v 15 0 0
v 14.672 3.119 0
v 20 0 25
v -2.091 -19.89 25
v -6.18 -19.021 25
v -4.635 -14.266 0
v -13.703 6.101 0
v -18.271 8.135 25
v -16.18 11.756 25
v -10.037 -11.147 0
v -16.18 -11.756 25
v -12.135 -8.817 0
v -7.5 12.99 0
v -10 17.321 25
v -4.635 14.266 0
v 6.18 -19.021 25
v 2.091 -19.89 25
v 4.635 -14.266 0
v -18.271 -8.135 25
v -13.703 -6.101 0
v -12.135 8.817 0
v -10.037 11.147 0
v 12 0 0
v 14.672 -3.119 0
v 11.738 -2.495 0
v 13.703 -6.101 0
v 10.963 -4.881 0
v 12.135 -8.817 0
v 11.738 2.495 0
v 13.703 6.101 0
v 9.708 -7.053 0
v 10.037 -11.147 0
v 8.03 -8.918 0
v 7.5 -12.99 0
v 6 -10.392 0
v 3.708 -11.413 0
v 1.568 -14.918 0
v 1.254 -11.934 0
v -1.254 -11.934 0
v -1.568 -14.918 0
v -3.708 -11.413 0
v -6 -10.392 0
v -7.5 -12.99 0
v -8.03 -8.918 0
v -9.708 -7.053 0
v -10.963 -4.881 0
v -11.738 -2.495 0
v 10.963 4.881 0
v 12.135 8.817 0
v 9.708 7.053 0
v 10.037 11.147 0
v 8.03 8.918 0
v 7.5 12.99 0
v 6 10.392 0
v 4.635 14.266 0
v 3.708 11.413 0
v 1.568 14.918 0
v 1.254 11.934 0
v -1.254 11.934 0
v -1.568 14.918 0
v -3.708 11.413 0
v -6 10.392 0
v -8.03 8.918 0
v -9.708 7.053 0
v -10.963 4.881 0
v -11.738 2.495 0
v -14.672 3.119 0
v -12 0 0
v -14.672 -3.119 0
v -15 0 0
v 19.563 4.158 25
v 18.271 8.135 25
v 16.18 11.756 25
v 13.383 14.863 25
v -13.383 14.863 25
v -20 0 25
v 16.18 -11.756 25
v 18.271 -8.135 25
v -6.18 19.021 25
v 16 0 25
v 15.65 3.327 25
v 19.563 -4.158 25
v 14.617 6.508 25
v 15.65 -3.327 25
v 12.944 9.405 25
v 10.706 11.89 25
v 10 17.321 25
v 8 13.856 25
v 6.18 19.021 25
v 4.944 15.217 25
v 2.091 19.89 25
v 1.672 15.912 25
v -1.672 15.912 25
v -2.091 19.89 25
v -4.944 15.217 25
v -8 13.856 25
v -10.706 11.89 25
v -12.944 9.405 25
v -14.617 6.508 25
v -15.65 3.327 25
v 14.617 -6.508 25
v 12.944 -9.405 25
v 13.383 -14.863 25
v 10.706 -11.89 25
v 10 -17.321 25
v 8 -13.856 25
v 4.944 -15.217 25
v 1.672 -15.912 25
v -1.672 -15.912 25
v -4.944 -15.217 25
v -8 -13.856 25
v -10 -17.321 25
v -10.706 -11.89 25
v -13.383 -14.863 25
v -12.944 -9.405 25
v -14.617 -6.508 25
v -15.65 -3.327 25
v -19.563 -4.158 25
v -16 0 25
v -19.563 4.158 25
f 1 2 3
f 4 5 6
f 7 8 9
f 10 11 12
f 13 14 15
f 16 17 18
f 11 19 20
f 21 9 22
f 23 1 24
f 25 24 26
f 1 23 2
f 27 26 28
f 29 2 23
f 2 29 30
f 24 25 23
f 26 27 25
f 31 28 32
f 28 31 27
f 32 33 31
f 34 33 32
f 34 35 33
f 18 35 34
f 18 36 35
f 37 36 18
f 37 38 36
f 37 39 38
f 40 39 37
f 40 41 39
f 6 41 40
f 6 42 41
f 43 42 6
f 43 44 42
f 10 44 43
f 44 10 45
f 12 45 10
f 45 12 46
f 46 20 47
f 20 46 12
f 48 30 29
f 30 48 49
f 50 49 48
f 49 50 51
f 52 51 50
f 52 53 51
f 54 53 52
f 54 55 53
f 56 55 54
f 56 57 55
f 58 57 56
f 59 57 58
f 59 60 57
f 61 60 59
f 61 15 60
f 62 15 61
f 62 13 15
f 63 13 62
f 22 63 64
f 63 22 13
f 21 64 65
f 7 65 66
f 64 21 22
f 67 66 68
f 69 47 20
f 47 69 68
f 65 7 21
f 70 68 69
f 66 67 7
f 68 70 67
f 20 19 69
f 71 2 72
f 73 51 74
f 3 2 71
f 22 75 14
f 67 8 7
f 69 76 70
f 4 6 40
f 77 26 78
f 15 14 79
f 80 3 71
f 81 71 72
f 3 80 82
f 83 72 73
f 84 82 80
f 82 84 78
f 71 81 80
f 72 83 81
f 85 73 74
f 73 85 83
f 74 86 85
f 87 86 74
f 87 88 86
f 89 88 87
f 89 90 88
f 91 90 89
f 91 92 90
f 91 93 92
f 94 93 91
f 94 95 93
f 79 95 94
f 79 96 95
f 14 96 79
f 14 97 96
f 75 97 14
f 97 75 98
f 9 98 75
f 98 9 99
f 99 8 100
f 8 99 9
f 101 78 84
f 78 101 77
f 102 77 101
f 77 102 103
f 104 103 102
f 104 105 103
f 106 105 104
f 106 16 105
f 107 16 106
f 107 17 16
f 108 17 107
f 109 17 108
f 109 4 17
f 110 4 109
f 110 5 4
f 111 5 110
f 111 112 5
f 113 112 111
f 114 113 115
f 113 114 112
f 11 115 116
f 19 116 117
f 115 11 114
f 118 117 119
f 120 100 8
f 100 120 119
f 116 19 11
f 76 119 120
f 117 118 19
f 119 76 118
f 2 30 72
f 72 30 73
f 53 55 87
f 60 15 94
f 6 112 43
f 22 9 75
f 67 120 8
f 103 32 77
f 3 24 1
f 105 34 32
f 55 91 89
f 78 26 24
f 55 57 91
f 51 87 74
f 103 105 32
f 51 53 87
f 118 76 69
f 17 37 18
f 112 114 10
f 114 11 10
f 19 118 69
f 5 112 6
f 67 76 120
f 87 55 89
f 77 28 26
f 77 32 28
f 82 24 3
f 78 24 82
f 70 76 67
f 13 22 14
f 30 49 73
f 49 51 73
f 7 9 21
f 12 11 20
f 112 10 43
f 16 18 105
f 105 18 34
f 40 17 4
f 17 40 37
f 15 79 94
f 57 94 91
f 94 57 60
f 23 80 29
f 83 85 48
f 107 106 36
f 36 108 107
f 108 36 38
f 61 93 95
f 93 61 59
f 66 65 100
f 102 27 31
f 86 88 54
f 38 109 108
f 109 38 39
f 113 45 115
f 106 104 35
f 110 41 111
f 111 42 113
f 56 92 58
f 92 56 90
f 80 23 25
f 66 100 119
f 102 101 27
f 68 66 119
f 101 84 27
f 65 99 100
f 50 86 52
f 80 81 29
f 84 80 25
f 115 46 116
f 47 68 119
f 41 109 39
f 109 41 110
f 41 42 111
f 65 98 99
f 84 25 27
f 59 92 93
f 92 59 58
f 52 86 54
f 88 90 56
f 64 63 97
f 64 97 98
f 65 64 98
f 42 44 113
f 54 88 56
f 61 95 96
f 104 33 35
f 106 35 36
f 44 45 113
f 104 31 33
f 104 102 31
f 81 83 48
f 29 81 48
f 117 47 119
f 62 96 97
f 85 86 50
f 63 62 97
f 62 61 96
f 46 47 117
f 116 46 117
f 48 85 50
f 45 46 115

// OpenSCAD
out_top = 20;
out_bot = 15;
in_top = 16;
in_bot = 12;
height = 25;

difference(){
//outer cylinder
cylinder(r2=out_top,r1=out_bot,h=height);
//inner cylinder
cylinder(r2=in_top,r1=in_bot,h=height);
}
